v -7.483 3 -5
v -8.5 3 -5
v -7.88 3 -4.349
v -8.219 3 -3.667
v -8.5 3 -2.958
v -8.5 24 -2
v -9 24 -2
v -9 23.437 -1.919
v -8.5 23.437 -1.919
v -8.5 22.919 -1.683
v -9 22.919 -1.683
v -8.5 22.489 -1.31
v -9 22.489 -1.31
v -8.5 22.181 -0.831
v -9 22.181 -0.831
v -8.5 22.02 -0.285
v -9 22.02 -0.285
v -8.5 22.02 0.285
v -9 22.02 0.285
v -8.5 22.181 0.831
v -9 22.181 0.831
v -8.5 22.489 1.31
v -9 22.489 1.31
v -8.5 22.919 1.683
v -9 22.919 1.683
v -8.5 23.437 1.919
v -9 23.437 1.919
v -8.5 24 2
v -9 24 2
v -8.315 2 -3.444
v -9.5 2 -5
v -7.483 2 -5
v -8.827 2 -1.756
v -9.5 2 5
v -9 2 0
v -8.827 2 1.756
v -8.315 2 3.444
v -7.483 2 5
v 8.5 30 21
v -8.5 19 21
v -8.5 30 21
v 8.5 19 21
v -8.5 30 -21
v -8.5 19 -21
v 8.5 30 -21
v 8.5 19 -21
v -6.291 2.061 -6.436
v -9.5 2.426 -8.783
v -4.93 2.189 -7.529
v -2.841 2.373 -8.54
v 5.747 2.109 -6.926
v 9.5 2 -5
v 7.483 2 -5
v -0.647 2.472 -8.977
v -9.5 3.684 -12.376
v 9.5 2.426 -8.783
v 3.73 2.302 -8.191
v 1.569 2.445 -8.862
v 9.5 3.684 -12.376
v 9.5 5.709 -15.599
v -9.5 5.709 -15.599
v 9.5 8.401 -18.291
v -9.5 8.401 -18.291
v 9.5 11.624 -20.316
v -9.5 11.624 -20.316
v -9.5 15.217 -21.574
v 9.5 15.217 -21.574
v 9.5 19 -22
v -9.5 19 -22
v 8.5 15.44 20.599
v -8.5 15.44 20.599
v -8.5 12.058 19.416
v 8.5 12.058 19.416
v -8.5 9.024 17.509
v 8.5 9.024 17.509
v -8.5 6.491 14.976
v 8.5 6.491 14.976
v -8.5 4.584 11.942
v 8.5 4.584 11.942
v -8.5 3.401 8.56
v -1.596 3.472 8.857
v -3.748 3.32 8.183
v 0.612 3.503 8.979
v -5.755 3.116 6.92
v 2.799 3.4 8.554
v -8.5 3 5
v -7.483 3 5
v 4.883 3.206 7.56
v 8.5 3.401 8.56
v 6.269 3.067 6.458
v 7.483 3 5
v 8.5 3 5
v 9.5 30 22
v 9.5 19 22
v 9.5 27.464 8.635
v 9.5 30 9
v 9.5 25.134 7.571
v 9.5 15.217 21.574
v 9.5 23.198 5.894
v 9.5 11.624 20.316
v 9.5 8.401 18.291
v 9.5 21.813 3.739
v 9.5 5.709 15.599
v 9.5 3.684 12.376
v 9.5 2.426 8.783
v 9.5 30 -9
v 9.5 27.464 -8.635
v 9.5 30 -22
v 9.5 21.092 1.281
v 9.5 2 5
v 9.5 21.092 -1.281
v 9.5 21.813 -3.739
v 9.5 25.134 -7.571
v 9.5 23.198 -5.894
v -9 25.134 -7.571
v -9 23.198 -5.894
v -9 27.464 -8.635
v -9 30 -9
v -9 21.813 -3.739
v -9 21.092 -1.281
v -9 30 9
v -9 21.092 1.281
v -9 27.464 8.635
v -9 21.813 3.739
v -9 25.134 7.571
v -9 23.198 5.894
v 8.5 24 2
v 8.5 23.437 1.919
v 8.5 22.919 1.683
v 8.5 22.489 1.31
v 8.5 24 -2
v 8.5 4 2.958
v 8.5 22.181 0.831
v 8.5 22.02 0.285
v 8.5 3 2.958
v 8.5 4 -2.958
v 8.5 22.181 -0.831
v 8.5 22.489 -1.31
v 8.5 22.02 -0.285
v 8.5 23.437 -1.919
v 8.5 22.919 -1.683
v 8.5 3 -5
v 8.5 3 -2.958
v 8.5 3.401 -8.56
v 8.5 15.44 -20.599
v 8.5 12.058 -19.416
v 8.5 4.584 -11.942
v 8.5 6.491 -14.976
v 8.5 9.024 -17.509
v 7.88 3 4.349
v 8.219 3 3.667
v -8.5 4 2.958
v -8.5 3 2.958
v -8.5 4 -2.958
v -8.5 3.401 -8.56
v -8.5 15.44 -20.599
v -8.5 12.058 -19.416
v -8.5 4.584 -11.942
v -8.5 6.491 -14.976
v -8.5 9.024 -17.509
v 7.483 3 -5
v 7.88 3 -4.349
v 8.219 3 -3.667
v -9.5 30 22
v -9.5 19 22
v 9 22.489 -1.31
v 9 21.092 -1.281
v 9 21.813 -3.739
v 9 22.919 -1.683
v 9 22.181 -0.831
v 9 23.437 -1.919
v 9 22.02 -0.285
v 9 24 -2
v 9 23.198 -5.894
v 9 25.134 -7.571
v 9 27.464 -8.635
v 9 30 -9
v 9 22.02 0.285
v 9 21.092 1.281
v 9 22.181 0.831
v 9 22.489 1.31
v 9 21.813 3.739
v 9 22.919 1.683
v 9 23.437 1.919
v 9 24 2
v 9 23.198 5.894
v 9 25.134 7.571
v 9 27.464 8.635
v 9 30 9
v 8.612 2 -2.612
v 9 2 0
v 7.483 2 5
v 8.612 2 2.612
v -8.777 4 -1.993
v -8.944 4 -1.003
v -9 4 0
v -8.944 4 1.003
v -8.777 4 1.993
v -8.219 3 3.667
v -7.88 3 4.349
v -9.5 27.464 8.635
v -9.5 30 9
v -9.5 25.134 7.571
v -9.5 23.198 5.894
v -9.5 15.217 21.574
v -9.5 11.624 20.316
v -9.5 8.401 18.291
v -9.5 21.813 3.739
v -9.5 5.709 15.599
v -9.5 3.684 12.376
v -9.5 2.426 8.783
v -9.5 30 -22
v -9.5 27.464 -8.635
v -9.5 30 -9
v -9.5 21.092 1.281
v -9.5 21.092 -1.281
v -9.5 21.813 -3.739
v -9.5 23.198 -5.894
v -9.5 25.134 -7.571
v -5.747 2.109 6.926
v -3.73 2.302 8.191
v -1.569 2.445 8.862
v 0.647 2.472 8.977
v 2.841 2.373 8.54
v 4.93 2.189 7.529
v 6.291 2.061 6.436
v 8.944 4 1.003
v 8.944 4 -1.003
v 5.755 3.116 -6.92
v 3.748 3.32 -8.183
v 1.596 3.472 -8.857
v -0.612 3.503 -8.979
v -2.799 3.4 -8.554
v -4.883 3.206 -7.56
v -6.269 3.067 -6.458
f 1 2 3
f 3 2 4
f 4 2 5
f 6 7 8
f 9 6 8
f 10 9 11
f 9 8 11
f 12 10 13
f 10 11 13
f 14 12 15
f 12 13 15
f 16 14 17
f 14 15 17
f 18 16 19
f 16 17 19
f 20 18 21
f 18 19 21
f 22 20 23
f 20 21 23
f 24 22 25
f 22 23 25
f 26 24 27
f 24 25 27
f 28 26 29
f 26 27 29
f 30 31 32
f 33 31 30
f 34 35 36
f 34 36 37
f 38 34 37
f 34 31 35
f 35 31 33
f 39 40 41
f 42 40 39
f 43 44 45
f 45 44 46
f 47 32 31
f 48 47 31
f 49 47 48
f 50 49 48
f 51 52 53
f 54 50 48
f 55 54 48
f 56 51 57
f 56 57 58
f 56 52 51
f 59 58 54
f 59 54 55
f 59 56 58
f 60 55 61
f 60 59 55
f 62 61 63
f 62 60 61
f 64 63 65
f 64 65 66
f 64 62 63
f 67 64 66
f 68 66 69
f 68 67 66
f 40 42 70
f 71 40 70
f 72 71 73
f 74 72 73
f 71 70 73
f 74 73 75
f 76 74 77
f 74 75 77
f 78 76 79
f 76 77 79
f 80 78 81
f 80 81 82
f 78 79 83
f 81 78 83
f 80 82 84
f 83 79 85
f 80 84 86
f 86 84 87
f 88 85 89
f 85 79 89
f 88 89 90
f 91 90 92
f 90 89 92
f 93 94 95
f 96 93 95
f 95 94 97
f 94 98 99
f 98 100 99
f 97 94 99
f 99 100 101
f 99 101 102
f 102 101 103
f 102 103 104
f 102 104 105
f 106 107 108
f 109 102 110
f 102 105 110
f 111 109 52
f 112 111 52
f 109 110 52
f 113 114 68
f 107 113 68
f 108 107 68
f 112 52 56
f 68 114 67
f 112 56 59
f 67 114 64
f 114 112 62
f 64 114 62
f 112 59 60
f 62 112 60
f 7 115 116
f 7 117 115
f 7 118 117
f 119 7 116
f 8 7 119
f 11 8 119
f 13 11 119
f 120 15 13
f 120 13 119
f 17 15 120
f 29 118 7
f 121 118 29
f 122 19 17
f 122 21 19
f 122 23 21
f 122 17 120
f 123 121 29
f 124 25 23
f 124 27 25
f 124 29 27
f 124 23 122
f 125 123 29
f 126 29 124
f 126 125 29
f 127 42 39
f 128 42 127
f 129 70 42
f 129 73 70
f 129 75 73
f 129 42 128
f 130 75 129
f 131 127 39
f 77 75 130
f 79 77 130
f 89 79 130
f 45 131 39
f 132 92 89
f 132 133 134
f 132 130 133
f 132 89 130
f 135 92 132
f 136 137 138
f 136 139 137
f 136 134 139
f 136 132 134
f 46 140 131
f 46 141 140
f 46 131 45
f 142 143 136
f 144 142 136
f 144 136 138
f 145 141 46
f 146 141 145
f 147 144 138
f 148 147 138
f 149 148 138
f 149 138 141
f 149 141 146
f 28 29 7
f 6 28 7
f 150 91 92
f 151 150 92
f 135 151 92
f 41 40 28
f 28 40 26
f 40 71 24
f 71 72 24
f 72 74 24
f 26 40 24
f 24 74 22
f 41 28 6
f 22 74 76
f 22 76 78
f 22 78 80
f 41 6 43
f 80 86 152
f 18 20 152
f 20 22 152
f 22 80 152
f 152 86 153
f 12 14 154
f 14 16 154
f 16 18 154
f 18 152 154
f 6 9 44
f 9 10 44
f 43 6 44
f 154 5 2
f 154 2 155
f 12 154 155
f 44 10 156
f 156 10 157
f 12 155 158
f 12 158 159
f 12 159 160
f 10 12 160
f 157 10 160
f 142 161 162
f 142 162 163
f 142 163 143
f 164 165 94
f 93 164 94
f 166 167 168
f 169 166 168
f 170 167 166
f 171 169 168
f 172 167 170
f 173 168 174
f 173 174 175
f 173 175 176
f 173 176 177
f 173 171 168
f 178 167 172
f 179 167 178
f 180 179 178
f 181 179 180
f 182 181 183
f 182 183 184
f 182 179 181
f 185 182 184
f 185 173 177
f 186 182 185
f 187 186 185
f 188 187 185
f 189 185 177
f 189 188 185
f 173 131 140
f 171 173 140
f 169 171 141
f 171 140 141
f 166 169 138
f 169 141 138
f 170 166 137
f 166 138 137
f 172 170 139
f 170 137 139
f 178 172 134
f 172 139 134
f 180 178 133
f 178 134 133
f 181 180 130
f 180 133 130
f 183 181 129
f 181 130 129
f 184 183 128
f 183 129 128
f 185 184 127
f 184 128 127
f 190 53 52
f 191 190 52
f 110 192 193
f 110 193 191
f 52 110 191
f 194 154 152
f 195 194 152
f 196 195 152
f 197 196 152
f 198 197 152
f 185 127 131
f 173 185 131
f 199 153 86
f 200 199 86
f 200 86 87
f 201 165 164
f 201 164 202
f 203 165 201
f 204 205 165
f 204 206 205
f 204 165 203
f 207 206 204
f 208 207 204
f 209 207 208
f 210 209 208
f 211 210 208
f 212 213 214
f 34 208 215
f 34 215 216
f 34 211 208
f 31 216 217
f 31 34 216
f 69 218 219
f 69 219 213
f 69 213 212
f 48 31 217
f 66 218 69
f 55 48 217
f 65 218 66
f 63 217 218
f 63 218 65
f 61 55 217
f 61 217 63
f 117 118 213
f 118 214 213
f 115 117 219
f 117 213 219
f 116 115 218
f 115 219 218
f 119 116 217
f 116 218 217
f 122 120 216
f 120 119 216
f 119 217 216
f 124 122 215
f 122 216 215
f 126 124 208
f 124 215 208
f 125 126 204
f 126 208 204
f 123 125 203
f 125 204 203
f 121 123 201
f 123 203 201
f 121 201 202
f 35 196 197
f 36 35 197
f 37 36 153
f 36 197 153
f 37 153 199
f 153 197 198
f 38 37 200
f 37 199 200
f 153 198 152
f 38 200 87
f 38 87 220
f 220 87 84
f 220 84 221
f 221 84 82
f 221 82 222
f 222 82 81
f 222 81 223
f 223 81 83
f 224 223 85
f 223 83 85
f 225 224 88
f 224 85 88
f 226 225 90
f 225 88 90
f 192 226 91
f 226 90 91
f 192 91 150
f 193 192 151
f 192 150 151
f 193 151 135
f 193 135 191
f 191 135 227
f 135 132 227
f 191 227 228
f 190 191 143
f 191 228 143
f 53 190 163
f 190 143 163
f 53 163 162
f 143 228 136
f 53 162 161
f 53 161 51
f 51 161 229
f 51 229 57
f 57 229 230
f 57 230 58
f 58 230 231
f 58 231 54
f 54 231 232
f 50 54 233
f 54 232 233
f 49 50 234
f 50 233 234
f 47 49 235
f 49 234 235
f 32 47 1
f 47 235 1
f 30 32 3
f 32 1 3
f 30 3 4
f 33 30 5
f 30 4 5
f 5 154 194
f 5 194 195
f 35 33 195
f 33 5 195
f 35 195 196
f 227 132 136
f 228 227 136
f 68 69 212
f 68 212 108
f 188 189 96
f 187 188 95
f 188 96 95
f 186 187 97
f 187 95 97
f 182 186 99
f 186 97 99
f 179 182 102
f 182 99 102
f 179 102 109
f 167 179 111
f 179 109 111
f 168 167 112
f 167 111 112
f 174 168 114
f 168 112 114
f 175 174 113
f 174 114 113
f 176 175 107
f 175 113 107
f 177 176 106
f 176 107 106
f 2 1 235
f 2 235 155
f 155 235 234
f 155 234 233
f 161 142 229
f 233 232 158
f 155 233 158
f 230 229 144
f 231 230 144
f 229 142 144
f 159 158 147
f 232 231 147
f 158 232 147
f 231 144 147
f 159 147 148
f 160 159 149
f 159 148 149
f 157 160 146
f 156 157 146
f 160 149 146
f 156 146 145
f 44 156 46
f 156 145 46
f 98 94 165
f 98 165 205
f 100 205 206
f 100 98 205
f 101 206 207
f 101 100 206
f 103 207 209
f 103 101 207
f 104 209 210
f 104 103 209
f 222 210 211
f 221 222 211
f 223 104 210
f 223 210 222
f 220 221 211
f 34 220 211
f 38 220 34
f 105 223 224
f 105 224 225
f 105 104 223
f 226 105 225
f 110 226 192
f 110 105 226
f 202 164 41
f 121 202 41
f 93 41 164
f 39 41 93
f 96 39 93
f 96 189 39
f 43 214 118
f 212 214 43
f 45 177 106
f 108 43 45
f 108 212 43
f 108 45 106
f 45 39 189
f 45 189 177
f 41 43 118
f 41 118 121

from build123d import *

# Parameters (mm, degrees)
F2_W      = 19
F2_H      = 44
F3_DEPTH  = 23
F3_FACE_W = 19
F3_FACE_H = 44
F4_DEPTH  = 5
F5_R      = 17
F6_T      = -1
F7_R      = 9
F8_DEPTH  = 1
F9_R      = 9
F10_DEPTH = 0.5
F11_R     = 9
F12_DEPTH = 0.5
F14_DEPTH = 25


with BuildPart() as f3:
    # F2 (on offset) → F3 (new body)
    with BuildSketch(Plane.XZ.offset(-25)):
        Rectangle(F2_W, F2_H)
    extrude(amount=F3_DEPTH)

    # F3_face (on face) → F4 (join)
    with BuildSketch(Plane(origin=(0, 25, 0), x_dir=(1, 0, 0), z_dir=(0, 1, 0))):
        Rectangle(F3_FACE_W, F3_FACE_H)
    extrude(amount=F4_DEPTH)

    # F5
    f5_edges = [f3.edges().sort_by_distance(p)[0] for p in [
        (0, 2, 22),
        (0, 2, -22),
    ]]
    fillet(f5_edges, radius=F5_R)

    # F6
    f6_openings = [f3.faces().sort_by_distance(p)[0] for p in [
        (0, 30, 0),
    ]]
    offset(amount=F6_T, openings=f6_openings)

    # F7 (on face) → F8 (cut, symmetric)
    with BuildSketch(Plane(origin=(0, 3, 0), x_dir=(-1, 0, 0), z_dir=(0, 1, 0))):
        Circle(F7_R)
    extrude(amount=F8_DEPTH, both=True, mode=Mode.SUBTRACT)

    # F9 (on face) → F10 (cut)
    with BuildSketch(Plane.YZ.offset(9.5)):
        with Locations((30, 0)):
            Circle(F9_R)
    extrude(amount=-F10_DEPTH, mode=Mode.SUBTRACT)

    # F11 (on face) → F12 (cut)
    with BuildSketch(Plane(origin=(-9.5, 0, 0), x_dir=(0, -1, 0), z_dir=(-1, 0, 0))):
        with Locations((-30, 0)):
            Circle(F11_R)
    extrude(amount=-F12_DEPTH, mode=Mode.SUBTRACT)

    # F13 (on face) → F14 (cut)
    with BuildSketch(Plane(origin=(-9, 0, 0), x_dir=(0, -1, 0), z_dir=(-1, 0, 0))):
        with BuildLine():
            Line((-24, 2), (-24, -2))
            ThreePointArc((-24, -2), (-22, 0), (-24, 2))
        make_face()
    extrude(amount=-F14_DEPTH, mode=Mode.SUBTRACT)


solid = f3.part
